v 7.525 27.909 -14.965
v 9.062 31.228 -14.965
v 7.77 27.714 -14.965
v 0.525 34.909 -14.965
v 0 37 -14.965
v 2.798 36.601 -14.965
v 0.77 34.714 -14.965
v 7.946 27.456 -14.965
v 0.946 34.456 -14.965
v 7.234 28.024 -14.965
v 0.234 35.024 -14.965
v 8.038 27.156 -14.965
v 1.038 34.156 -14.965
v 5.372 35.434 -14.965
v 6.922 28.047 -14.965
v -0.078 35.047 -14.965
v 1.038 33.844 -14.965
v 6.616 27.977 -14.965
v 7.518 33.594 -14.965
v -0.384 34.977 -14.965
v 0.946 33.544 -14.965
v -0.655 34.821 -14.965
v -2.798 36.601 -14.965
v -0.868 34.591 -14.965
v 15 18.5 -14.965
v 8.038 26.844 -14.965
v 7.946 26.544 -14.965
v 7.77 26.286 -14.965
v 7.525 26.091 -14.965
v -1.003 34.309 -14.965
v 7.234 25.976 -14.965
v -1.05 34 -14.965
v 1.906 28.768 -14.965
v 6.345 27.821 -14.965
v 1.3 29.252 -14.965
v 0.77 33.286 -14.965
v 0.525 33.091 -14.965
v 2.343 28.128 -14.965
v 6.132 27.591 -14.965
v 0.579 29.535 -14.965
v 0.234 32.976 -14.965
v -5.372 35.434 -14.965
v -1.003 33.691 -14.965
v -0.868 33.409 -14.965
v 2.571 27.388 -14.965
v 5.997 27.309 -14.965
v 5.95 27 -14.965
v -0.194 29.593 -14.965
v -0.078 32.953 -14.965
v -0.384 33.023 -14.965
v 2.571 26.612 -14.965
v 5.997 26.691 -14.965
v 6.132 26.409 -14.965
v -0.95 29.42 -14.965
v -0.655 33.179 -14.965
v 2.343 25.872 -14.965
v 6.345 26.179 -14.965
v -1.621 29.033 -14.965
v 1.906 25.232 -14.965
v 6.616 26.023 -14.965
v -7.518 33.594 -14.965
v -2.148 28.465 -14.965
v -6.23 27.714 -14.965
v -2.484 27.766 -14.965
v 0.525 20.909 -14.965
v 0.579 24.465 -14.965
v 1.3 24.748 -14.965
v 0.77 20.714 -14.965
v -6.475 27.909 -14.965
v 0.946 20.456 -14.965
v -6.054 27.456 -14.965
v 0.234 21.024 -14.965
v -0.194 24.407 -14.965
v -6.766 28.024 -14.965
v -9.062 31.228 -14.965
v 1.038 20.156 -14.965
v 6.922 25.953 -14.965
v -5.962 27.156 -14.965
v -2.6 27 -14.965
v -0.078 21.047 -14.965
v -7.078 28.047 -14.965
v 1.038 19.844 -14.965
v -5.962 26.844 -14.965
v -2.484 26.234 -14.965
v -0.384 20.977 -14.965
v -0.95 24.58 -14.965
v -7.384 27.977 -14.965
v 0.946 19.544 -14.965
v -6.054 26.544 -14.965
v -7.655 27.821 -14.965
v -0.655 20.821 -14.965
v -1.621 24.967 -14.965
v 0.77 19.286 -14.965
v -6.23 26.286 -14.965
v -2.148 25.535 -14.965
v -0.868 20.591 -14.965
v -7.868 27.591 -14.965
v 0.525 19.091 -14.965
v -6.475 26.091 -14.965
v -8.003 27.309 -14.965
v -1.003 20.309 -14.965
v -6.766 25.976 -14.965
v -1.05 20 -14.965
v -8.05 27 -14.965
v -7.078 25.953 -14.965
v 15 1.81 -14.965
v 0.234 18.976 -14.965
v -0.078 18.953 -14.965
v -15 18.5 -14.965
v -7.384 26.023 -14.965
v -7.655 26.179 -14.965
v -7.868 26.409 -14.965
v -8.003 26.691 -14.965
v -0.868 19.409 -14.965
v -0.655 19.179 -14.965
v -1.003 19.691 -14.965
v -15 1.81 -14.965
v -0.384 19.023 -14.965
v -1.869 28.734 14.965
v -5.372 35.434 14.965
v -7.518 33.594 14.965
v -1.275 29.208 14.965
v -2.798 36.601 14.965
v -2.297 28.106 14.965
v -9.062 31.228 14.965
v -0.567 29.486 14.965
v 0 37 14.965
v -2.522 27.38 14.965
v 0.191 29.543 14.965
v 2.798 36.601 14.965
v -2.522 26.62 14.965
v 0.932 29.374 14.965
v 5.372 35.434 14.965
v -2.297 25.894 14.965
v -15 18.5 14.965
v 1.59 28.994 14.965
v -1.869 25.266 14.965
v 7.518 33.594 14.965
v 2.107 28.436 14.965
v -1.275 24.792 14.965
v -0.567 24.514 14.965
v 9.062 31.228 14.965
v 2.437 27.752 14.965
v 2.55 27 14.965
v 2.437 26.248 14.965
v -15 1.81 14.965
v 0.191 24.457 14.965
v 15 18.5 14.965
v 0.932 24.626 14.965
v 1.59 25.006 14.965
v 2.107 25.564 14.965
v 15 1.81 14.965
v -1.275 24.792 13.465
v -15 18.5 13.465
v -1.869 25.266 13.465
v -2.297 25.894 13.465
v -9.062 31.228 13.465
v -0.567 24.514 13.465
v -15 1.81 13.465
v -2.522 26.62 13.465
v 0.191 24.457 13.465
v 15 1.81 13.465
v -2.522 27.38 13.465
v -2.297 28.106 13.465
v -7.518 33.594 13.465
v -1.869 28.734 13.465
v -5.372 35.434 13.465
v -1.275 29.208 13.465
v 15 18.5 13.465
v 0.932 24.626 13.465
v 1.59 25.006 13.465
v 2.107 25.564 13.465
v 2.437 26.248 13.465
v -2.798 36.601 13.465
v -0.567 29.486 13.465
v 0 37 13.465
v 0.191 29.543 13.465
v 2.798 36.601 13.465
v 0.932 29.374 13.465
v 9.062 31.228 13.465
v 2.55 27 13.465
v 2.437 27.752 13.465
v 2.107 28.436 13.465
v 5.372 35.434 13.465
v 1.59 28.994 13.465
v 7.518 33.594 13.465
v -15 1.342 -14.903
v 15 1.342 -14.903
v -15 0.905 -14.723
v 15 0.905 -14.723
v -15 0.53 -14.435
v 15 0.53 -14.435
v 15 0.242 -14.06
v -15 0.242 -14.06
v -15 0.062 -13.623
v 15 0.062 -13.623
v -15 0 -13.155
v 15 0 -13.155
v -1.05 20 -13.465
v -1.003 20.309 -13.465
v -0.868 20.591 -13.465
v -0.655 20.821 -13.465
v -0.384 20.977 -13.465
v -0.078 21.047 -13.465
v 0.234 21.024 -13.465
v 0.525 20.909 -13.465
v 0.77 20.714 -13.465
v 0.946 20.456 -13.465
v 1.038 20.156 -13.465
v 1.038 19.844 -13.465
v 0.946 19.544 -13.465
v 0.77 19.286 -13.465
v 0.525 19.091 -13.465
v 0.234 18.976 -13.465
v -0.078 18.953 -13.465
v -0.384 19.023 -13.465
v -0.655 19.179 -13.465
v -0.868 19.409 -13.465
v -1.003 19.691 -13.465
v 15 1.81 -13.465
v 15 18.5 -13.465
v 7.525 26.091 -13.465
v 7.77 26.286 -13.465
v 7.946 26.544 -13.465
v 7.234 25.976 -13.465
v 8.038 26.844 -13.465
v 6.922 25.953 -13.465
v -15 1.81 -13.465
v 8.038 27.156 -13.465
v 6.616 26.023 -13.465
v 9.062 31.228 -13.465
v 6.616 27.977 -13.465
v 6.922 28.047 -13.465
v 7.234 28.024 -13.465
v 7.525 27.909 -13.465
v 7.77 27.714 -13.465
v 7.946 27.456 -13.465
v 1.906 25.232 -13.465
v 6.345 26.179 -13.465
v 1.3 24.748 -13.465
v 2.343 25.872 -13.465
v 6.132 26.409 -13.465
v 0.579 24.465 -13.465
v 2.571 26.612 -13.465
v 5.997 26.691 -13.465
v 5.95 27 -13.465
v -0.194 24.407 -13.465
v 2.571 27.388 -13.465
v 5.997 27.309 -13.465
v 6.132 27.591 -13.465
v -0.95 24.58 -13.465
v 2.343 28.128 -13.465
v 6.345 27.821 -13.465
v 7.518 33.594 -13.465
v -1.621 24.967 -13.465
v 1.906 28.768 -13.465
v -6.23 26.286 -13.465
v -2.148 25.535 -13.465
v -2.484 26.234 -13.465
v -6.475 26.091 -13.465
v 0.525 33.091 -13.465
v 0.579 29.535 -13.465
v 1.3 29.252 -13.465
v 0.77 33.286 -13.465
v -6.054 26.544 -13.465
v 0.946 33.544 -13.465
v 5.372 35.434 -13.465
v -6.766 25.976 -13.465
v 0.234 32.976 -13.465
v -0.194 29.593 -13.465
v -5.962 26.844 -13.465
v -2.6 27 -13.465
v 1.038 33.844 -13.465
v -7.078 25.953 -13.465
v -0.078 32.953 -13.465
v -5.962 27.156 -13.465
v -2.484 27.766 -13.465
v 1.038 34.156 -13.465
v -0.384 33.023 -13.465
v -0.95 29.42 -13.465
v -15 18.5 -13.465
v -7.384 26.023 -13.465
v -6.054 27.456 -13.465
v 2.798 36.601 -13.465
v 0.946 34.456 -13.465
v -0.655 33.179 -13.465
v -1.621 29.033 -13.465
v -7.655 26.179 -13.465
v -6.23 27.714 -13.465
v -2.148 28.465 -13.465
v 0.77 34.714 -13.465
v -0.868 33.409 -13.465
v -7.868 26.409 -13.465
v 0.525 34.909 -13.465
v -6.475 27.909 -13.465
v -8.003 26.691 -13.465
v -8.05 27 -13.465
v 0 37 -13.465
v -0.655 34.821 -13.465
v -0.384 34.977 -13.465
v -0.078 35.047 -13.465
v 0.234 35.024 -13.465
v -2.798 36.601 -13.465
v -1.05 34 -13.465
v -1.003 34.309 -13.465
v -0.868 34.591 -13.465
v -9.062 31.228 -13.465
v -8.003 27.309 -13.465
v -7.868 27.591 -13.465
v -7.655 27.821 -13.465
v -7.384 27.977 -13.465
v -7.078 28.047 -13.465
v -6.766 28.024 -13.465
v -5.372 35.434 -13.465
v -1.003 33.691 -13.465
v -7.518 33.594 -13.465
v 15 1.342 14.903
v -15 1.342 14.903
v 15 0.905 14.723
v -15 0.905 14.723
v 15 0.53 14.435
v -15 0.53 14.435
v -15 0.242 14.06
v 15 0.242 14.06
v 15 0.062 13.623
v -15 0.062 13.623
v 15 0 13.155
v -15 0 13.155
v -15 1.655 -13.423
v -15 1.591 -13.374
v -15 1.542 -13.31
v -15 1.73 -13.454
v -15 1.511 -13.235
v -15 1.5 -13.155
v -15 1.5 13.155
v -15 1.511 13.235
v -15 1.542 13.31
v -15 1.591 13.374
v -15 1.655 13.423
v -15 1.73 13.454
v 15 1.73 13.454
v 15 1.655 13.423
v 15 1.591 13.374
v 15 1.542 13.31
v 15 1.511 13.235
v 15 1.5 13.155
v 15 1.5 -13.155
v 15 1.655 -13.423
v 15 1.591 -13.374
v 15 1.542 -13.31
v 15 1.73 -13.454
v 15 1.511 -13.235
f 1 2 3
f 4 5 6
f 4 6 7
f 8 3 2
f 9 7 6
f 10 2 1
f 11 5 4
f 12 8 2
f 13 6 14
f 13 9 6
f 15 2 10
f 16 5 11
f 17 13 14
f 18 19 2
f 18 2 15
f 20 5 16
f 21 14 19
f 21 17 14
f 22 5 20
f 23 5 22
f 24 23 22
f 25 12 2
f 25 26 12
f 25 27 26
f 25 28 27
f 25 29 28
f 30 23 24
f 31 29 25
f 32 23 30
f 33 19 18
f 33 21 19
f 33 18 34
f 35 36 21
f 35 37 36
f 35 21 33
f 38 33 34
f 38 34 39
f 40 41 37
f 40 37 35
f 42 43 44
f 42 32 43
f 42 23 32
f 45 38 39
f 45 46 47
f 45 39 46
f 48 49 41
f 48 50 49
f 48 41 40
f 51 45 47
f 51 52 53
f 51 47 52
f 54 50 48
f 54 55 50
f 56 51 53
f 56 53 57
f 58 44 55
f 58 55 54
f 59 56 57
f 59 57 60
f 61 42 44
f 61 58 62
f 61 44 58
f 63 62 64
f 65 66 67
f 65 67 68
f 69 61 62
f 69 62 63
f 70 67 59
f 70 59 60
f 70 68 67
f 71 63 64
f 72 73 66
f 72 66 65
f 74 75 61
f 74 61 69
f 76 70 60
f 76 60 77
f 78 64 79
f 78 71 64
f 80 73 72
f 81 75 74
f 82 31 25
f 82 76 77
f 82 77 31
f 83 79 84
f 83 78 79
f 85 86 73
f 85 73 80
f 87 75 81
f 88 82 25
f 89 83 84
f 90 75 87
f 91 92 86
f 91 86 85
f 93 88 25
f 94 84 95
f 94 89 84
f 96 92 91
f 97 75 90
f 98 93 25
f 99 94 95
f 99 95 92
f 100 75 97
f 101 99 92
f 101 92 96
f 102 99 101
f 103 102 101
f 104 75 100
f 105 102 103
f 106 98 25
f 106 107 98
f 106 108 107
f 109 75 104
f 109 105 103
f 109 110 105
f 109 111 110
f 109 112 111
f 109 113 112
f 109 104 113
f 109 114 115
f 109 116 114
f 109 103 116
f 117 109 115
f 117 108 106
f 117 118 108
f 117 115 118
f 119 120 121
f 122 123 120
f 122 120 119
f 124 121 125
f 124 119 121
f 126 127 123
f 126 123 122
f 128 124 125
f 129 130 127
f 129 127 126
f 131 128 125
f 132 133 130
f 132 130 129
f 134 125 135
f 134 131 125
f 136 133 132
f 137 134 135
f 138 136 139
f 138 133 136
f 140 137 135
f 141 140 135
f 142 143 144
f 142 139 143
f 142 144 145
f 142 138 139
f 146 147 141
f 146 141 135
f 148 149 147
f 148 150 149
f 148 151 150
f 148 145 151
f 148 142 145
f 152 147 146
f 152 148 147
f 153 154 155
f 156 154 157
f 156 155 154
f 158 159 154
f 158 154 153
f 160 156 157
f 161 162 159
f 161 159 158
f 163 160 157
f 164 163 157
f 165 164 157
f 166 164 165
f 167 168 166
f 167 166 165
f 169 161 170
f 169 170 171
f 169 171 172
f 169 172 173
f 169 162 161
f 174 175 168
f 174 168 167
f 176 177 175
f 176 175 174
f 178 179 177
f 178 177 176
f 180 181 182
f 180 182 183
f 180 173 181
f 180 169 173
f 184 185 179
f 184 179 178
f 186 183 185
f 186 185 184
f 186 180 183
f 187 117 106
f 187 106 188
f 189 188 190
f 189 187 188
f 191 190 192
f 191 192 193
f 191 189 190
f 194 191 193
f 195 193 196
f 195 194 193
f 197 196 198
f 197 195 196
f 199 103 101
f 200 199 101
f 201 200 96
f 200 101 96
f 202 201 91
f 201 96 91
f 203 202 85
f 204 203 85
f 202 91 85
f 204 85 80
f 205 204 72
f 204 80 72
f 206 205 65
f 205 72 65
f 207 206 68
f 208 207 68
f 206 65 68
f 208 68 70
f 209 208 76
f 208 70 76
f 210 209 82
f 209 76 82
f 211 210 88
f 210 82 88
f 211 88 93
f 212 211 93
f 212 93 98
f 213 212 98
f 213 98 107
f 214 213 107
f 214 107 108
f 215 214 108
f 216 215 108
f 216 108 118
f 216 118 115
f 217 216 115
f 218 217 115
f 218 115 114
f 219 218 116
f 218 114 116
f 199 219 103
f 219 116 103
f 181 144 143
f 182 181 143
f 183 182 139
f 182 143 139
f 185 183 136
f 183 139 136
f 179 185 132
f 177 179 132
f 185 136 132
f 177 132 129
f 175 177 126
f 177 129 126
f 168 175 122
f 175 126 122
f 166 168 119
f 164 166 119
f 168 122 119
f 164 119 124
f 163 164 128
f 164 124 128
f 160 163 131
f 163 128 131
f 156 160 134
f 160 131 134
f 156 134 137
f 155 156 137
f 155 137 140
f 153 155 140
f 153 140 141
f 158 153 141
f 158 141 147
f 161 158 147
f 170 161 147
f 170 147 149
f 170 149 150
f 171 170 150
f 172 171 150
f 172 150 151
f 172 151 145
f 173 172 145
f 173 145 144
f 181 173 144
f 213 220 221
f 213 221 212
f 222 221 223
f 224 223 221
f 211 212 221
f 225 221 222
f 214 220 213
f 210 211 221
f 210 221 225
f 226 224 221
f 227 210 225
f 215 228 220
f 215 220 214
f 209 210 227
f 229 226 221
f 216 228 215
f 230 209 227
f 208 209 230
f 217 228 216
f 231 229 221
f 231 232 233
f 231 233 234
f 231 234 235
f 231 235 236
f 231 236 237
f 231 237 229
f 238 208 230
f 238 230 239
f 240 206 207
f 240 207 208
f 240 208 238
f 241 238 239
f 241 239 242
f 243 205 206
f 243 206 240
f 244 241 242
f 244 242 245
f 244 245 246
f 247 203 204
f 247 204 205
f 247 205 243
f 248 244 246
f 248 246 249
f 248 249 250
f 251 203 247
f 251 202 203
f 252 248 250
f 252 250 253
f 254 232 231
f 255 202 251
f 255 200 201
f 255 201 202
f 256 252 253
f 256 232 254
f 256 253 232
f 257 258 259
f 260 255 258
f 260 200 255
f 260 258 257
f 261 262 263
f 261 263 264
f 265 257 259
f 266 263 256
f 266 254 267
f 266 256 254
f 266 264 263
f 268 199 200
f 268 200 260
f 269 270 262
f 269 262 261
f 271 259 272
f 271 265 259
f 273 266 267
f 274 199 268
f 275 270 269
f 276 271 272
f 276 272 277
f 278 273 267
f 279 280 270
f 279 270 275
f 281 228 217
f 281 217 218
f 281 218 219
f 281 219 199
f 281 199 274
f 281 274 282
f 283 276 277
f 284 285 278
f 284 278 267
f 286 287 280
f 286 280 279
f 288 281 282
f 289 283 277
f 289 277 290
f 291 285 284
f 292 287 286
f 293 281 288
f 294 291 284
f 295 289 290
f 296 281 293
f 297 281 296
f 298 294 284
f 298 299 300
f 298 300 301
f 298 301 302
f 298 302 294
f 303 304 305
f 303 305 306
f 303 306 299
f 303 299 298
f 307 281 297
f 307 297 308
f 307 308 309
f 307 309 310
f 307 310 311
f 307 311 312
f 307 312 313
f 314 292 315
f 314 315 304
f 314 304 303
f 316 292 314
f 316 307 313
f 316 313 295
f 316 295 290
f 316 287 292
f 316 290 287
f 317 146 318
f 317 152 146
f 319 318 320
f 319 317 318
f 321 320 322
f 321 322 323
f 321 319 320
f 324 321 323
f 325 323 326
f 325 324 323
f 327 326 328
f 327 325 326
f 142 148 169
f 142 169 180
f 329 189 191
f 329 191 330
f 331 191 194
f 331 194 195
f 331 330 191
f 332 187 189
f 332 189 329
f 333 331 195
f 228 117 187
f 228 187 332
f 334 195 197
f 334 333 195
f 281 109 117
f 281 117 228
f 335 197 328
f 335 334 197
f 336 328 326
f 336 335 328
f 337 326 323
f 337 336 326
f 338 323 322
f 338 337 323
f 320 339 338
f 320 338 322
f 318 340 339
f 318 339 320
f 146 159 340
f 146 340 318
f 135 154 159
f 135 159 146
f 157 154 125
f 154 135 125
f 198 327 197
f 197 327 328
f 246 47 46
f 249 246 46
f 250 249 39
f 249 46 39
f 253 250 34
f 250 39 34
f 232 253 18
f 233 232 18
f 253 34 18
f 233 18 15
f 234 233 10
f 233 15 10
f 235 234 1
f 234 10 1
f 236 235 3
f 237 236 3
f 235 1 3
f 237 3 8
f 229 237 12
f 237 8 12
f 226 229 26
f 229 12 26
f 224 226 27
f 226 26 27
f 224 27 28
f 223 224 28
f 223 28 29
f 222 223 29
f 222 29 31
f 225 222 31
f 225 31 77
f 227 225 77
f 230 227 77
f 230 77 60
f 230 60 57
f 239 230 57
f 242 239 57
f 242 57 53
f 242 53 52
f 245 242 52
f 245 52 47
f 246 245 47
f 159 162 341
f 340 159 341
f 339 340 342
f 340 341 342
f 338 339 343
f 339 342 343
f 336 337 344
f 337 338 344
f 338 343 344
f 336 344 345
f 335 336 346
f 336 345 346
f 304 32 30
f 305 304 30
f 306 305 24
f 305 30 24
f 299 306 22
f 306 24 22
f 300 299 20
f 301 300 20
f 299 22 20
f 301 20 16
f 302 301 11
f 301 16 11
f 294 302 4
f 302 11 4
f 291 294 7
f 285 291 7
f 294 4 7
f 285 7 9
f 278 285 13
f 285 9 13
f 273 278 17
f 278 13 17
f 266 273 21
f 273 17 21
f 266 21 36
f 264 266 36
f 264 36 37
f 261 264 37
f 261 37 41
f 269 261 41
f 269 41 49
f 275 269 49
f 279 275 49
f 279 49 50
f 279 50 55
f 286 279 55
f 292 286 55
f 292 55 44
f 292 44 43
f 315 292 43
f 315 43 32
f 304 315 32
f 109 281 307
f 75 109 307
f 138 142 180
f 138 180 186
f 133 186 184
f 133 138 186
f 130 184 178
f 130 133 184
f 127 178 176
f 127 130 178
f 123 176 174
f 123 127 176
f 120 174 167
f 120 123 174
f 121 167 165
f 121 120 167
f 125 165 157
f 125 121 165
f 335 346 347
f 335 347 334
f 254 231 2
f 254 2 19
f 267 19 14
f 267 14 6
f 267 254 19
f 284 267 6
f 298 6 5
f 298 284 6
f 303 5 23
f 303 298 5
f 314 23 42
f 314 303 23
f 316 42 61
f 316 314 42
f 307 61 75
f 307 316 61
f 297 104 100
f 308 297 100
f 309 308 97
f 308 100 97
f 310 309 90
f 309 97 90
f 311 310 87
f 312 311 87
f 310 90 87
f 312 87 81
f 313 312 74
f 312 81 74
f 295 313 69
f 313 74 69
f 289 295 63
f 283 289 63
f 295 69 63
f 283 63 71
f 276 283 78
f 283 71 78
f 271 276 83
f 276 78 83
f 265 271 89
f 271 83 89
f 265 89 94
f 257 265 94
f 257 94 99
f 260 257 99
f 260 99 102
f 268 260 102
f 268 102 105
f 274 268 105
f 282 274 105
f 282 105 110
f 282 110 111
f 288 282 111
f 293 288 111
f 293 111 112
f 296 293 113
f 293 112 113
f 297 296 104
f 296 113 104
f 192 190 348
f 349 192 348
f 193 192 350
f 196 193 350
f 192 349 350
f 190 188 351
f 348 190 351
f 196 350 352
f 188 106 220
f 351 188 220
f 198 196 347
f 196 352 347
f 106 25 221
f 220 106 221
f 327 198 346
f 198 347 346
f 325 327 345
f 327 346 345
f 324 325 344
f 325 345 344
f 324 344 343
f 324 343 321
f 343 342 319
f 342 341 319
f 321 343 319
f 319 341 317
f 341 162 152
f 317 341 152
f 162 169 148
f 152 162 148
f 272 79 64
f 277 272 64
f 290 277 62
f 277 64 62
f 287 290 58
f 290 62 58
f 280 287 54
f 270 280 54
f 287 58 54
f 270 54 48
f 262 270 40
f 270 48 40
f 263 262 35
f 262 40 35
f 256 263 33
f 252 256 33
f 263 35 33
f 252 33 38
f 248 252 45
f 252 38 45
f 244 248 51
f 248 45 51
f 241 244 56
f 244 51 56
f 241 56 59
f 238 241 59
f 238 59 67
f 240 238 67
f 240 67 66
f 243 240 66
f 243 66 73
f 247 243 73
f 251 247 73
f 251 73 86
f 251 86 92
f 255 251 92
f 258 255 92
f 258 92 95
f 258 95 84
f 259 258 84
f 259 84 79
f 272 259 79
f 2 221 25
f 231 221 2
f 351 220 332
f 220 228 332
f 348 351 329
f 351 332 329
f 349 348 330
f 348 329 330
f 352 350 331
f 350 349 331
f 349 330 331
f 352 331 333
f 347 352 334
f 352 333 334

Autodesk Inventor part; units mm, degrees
ref_plane "YZ Plane" through (0, 0, 0) normal (1, 0, 0) x (0, 1, 0)
ref_plane "XZ Plane" through (0, 0, 0) normal (0, 1, 0) x (-1, 0, 0)
ref_plane "XY Plane" through (0, 0, 0) normal (0, 0, 1) x (1, 0, 0)
sketch "Sketch1" plane through (0, 0, 0) normal (0, 1, 0) x (-1, 0, 0)
  line L0 (15, 14.965) -> (-15, 14.965)
  line L1 (-15, 14.965) -> (-15, -14.965)
  line L2 (-15, -14.965) -> (15, -14.965)
  line L3 (15, -14.965) -> (15, 14.965)
  point P0 (0, 0)
  dimension "d0" = 29.93
  dimension "d1" = 30
  dimension "d2" = 15
  dimension "d3" = 14.965
extrude "Plate1" add sketch "Sketch1" along normal blind 1.5
sketch "Sketch2" plane through (-15, 0, -13.465) normal (0, 0, -1) x (-1, 0, 0)
  line L0 (-30, 0) -> (0, 0)
  line L1 (0, 0) -> (0, 37)
  line L2 (0, 37) -> (-30, 37)
  line L3 (-30, 37) -> (-30, 0)
edge flange "Flange1" height 37 angle 90 thickness 1.5 bend radius 0.31 thickness toward (0, 0, -1) relief tear relief width 1.5 relief depth 0.75 corner gap 0.31 corner form 0 edges at (0, 1.5, -14.965) (0, 1.5, 14.965) wall of the first edge with corners at (15, 0, -13.465) (-15, 0, -13.465) (-15, 37, -13.465) (15, 37, -13.465)
bend "Bend1"
corner "Corner1"
sketch "Sketch3" plane through (-15, 37, 14.965) normal (0, 0, 1) x (1, 0, 0)
  line L0 (0, 0) -> (30, 0) projected
  line L1 (0, -35.19) -> (0, 0) projected
  circle A0 centre (15, -10) radius 10
  line L2 (0, -18.5) -> (30, -18.5)
  line L3 (30, -18.5) -> (30, -28.5)
  line L4 (30, -28.5) -> (0, -28.5)
  line L5 (0, -28.5) -> (0, -18.5)
  line L6 (30, -18.5) -> (24.0624, -5.7723)
  line L7 (0, -18.5) -> (5.9376, -5.7723)
  line L8 (0, 0) -> (30, 0)
  line L9 (30, 0) -> (30, -25)
  line L10 (30, -25) -> (0, -25)
  line L11 (0, -25) -> (0, 0)
  point P0 (15, -37)
  point P1 (15, 0)
  dimension "d15" = 10
  dimension "d16" = 0
  dimension "d17" = 20
  dimension "d18" = 8.5
  dimension "d19" = 0
  dimension "d20" = 30
  dimension "d21" = 10
  dimension "d22" = 25
extrude "Extrusion1" cut sketch "Sketch3" against normal blind 35 contours L0 A0 L7 L1 | L0 L9 L6 A0
sketch "Sketch4" plane through (15, 1.81, -14.965) normal (0, 0, -1) x (-1, 0, 0)
  arc A0 (24.0624, 29.4177) -> (5.9376, 29.4177) centre (15, 25.19) ccw projected
  circle A1 centre (15, 25.19) radius 2.6
  circle A2 centre (8, 25.19) radius 1.05
  circle A3 centre (22, 25.19) radius 1.05
  circle A4 centre (15, 32.19) radius 1.05
  circle A5 centre (15, 18.19) radius 1.05
  point P0 (15, -1.81)
  dimension "d25" = 5.2
  dimension "d26" = 0
  dimension "d27" = 7
  dimension "d28" = 2.1
  dimension "d29" = 7
  dimension "d30" = 0
  dimension "d31" = 2.1
  dimension "d32" = 0
  dimension "d33" = 7
  dimension "d34" = 2.1
  dimension "d35" = 7
  dimension "d36" = 0
  dimension "d37" = 2.1
extrude "Extrusion2" cut sketch "Sketch4" against normal blind 1.5
sketch "Sketch5" plane through (-15, 1.81, 14.965) normal (0, 0, 1) x (1, 0, 0)
  arc A0 (24.0624, 29.4177) -> (5.9376, 29.4177) centre (15, 25.19) ccw projected
  circle A1 centre (15, 25.19) radius 2.55
  point P0 (15, -1.81)
  dimension "d40" = 5.1
extrude "Extrusion3" cut sketch "Sketch5" against normal blind 1.5
equation "\"d4\" = Thickness"
equation "\"d5\" = BendReliefWidth"
equation "\"d6\" = BendReliefDepth"
equation "\"d7\" = MinimumRemnant"
equation "\"d8\" = TransitionRadius"
equation "\"d11\" = BendRadius"
equation "\"d12\" = CornerReliefSize"
equation "\"d13\" = GapSize"
equation "\"d14\" = JacobiRadiusSize"
equation "\"BendReliefWidth\" = Thickness"
equation "\"BendReliefDepth\" = 0.5 * Thickness"
equation "\"CornerReliefSize\" = 4 * Thickness"
equation "\"MinimumRemnant\" = 2 * Thickness"
equation "\"TransitionRadius\" = BendRadius"
equation "\"JacobiRadiusSize\" = BendRadius"
equation "\"GapSize\" = Thickness"
equation "\"Thickness\" = 1.5"
equation "\"BendRadius\" = 0.31"
properties part number "partpart" material "Aluminum 6061-AHC"
